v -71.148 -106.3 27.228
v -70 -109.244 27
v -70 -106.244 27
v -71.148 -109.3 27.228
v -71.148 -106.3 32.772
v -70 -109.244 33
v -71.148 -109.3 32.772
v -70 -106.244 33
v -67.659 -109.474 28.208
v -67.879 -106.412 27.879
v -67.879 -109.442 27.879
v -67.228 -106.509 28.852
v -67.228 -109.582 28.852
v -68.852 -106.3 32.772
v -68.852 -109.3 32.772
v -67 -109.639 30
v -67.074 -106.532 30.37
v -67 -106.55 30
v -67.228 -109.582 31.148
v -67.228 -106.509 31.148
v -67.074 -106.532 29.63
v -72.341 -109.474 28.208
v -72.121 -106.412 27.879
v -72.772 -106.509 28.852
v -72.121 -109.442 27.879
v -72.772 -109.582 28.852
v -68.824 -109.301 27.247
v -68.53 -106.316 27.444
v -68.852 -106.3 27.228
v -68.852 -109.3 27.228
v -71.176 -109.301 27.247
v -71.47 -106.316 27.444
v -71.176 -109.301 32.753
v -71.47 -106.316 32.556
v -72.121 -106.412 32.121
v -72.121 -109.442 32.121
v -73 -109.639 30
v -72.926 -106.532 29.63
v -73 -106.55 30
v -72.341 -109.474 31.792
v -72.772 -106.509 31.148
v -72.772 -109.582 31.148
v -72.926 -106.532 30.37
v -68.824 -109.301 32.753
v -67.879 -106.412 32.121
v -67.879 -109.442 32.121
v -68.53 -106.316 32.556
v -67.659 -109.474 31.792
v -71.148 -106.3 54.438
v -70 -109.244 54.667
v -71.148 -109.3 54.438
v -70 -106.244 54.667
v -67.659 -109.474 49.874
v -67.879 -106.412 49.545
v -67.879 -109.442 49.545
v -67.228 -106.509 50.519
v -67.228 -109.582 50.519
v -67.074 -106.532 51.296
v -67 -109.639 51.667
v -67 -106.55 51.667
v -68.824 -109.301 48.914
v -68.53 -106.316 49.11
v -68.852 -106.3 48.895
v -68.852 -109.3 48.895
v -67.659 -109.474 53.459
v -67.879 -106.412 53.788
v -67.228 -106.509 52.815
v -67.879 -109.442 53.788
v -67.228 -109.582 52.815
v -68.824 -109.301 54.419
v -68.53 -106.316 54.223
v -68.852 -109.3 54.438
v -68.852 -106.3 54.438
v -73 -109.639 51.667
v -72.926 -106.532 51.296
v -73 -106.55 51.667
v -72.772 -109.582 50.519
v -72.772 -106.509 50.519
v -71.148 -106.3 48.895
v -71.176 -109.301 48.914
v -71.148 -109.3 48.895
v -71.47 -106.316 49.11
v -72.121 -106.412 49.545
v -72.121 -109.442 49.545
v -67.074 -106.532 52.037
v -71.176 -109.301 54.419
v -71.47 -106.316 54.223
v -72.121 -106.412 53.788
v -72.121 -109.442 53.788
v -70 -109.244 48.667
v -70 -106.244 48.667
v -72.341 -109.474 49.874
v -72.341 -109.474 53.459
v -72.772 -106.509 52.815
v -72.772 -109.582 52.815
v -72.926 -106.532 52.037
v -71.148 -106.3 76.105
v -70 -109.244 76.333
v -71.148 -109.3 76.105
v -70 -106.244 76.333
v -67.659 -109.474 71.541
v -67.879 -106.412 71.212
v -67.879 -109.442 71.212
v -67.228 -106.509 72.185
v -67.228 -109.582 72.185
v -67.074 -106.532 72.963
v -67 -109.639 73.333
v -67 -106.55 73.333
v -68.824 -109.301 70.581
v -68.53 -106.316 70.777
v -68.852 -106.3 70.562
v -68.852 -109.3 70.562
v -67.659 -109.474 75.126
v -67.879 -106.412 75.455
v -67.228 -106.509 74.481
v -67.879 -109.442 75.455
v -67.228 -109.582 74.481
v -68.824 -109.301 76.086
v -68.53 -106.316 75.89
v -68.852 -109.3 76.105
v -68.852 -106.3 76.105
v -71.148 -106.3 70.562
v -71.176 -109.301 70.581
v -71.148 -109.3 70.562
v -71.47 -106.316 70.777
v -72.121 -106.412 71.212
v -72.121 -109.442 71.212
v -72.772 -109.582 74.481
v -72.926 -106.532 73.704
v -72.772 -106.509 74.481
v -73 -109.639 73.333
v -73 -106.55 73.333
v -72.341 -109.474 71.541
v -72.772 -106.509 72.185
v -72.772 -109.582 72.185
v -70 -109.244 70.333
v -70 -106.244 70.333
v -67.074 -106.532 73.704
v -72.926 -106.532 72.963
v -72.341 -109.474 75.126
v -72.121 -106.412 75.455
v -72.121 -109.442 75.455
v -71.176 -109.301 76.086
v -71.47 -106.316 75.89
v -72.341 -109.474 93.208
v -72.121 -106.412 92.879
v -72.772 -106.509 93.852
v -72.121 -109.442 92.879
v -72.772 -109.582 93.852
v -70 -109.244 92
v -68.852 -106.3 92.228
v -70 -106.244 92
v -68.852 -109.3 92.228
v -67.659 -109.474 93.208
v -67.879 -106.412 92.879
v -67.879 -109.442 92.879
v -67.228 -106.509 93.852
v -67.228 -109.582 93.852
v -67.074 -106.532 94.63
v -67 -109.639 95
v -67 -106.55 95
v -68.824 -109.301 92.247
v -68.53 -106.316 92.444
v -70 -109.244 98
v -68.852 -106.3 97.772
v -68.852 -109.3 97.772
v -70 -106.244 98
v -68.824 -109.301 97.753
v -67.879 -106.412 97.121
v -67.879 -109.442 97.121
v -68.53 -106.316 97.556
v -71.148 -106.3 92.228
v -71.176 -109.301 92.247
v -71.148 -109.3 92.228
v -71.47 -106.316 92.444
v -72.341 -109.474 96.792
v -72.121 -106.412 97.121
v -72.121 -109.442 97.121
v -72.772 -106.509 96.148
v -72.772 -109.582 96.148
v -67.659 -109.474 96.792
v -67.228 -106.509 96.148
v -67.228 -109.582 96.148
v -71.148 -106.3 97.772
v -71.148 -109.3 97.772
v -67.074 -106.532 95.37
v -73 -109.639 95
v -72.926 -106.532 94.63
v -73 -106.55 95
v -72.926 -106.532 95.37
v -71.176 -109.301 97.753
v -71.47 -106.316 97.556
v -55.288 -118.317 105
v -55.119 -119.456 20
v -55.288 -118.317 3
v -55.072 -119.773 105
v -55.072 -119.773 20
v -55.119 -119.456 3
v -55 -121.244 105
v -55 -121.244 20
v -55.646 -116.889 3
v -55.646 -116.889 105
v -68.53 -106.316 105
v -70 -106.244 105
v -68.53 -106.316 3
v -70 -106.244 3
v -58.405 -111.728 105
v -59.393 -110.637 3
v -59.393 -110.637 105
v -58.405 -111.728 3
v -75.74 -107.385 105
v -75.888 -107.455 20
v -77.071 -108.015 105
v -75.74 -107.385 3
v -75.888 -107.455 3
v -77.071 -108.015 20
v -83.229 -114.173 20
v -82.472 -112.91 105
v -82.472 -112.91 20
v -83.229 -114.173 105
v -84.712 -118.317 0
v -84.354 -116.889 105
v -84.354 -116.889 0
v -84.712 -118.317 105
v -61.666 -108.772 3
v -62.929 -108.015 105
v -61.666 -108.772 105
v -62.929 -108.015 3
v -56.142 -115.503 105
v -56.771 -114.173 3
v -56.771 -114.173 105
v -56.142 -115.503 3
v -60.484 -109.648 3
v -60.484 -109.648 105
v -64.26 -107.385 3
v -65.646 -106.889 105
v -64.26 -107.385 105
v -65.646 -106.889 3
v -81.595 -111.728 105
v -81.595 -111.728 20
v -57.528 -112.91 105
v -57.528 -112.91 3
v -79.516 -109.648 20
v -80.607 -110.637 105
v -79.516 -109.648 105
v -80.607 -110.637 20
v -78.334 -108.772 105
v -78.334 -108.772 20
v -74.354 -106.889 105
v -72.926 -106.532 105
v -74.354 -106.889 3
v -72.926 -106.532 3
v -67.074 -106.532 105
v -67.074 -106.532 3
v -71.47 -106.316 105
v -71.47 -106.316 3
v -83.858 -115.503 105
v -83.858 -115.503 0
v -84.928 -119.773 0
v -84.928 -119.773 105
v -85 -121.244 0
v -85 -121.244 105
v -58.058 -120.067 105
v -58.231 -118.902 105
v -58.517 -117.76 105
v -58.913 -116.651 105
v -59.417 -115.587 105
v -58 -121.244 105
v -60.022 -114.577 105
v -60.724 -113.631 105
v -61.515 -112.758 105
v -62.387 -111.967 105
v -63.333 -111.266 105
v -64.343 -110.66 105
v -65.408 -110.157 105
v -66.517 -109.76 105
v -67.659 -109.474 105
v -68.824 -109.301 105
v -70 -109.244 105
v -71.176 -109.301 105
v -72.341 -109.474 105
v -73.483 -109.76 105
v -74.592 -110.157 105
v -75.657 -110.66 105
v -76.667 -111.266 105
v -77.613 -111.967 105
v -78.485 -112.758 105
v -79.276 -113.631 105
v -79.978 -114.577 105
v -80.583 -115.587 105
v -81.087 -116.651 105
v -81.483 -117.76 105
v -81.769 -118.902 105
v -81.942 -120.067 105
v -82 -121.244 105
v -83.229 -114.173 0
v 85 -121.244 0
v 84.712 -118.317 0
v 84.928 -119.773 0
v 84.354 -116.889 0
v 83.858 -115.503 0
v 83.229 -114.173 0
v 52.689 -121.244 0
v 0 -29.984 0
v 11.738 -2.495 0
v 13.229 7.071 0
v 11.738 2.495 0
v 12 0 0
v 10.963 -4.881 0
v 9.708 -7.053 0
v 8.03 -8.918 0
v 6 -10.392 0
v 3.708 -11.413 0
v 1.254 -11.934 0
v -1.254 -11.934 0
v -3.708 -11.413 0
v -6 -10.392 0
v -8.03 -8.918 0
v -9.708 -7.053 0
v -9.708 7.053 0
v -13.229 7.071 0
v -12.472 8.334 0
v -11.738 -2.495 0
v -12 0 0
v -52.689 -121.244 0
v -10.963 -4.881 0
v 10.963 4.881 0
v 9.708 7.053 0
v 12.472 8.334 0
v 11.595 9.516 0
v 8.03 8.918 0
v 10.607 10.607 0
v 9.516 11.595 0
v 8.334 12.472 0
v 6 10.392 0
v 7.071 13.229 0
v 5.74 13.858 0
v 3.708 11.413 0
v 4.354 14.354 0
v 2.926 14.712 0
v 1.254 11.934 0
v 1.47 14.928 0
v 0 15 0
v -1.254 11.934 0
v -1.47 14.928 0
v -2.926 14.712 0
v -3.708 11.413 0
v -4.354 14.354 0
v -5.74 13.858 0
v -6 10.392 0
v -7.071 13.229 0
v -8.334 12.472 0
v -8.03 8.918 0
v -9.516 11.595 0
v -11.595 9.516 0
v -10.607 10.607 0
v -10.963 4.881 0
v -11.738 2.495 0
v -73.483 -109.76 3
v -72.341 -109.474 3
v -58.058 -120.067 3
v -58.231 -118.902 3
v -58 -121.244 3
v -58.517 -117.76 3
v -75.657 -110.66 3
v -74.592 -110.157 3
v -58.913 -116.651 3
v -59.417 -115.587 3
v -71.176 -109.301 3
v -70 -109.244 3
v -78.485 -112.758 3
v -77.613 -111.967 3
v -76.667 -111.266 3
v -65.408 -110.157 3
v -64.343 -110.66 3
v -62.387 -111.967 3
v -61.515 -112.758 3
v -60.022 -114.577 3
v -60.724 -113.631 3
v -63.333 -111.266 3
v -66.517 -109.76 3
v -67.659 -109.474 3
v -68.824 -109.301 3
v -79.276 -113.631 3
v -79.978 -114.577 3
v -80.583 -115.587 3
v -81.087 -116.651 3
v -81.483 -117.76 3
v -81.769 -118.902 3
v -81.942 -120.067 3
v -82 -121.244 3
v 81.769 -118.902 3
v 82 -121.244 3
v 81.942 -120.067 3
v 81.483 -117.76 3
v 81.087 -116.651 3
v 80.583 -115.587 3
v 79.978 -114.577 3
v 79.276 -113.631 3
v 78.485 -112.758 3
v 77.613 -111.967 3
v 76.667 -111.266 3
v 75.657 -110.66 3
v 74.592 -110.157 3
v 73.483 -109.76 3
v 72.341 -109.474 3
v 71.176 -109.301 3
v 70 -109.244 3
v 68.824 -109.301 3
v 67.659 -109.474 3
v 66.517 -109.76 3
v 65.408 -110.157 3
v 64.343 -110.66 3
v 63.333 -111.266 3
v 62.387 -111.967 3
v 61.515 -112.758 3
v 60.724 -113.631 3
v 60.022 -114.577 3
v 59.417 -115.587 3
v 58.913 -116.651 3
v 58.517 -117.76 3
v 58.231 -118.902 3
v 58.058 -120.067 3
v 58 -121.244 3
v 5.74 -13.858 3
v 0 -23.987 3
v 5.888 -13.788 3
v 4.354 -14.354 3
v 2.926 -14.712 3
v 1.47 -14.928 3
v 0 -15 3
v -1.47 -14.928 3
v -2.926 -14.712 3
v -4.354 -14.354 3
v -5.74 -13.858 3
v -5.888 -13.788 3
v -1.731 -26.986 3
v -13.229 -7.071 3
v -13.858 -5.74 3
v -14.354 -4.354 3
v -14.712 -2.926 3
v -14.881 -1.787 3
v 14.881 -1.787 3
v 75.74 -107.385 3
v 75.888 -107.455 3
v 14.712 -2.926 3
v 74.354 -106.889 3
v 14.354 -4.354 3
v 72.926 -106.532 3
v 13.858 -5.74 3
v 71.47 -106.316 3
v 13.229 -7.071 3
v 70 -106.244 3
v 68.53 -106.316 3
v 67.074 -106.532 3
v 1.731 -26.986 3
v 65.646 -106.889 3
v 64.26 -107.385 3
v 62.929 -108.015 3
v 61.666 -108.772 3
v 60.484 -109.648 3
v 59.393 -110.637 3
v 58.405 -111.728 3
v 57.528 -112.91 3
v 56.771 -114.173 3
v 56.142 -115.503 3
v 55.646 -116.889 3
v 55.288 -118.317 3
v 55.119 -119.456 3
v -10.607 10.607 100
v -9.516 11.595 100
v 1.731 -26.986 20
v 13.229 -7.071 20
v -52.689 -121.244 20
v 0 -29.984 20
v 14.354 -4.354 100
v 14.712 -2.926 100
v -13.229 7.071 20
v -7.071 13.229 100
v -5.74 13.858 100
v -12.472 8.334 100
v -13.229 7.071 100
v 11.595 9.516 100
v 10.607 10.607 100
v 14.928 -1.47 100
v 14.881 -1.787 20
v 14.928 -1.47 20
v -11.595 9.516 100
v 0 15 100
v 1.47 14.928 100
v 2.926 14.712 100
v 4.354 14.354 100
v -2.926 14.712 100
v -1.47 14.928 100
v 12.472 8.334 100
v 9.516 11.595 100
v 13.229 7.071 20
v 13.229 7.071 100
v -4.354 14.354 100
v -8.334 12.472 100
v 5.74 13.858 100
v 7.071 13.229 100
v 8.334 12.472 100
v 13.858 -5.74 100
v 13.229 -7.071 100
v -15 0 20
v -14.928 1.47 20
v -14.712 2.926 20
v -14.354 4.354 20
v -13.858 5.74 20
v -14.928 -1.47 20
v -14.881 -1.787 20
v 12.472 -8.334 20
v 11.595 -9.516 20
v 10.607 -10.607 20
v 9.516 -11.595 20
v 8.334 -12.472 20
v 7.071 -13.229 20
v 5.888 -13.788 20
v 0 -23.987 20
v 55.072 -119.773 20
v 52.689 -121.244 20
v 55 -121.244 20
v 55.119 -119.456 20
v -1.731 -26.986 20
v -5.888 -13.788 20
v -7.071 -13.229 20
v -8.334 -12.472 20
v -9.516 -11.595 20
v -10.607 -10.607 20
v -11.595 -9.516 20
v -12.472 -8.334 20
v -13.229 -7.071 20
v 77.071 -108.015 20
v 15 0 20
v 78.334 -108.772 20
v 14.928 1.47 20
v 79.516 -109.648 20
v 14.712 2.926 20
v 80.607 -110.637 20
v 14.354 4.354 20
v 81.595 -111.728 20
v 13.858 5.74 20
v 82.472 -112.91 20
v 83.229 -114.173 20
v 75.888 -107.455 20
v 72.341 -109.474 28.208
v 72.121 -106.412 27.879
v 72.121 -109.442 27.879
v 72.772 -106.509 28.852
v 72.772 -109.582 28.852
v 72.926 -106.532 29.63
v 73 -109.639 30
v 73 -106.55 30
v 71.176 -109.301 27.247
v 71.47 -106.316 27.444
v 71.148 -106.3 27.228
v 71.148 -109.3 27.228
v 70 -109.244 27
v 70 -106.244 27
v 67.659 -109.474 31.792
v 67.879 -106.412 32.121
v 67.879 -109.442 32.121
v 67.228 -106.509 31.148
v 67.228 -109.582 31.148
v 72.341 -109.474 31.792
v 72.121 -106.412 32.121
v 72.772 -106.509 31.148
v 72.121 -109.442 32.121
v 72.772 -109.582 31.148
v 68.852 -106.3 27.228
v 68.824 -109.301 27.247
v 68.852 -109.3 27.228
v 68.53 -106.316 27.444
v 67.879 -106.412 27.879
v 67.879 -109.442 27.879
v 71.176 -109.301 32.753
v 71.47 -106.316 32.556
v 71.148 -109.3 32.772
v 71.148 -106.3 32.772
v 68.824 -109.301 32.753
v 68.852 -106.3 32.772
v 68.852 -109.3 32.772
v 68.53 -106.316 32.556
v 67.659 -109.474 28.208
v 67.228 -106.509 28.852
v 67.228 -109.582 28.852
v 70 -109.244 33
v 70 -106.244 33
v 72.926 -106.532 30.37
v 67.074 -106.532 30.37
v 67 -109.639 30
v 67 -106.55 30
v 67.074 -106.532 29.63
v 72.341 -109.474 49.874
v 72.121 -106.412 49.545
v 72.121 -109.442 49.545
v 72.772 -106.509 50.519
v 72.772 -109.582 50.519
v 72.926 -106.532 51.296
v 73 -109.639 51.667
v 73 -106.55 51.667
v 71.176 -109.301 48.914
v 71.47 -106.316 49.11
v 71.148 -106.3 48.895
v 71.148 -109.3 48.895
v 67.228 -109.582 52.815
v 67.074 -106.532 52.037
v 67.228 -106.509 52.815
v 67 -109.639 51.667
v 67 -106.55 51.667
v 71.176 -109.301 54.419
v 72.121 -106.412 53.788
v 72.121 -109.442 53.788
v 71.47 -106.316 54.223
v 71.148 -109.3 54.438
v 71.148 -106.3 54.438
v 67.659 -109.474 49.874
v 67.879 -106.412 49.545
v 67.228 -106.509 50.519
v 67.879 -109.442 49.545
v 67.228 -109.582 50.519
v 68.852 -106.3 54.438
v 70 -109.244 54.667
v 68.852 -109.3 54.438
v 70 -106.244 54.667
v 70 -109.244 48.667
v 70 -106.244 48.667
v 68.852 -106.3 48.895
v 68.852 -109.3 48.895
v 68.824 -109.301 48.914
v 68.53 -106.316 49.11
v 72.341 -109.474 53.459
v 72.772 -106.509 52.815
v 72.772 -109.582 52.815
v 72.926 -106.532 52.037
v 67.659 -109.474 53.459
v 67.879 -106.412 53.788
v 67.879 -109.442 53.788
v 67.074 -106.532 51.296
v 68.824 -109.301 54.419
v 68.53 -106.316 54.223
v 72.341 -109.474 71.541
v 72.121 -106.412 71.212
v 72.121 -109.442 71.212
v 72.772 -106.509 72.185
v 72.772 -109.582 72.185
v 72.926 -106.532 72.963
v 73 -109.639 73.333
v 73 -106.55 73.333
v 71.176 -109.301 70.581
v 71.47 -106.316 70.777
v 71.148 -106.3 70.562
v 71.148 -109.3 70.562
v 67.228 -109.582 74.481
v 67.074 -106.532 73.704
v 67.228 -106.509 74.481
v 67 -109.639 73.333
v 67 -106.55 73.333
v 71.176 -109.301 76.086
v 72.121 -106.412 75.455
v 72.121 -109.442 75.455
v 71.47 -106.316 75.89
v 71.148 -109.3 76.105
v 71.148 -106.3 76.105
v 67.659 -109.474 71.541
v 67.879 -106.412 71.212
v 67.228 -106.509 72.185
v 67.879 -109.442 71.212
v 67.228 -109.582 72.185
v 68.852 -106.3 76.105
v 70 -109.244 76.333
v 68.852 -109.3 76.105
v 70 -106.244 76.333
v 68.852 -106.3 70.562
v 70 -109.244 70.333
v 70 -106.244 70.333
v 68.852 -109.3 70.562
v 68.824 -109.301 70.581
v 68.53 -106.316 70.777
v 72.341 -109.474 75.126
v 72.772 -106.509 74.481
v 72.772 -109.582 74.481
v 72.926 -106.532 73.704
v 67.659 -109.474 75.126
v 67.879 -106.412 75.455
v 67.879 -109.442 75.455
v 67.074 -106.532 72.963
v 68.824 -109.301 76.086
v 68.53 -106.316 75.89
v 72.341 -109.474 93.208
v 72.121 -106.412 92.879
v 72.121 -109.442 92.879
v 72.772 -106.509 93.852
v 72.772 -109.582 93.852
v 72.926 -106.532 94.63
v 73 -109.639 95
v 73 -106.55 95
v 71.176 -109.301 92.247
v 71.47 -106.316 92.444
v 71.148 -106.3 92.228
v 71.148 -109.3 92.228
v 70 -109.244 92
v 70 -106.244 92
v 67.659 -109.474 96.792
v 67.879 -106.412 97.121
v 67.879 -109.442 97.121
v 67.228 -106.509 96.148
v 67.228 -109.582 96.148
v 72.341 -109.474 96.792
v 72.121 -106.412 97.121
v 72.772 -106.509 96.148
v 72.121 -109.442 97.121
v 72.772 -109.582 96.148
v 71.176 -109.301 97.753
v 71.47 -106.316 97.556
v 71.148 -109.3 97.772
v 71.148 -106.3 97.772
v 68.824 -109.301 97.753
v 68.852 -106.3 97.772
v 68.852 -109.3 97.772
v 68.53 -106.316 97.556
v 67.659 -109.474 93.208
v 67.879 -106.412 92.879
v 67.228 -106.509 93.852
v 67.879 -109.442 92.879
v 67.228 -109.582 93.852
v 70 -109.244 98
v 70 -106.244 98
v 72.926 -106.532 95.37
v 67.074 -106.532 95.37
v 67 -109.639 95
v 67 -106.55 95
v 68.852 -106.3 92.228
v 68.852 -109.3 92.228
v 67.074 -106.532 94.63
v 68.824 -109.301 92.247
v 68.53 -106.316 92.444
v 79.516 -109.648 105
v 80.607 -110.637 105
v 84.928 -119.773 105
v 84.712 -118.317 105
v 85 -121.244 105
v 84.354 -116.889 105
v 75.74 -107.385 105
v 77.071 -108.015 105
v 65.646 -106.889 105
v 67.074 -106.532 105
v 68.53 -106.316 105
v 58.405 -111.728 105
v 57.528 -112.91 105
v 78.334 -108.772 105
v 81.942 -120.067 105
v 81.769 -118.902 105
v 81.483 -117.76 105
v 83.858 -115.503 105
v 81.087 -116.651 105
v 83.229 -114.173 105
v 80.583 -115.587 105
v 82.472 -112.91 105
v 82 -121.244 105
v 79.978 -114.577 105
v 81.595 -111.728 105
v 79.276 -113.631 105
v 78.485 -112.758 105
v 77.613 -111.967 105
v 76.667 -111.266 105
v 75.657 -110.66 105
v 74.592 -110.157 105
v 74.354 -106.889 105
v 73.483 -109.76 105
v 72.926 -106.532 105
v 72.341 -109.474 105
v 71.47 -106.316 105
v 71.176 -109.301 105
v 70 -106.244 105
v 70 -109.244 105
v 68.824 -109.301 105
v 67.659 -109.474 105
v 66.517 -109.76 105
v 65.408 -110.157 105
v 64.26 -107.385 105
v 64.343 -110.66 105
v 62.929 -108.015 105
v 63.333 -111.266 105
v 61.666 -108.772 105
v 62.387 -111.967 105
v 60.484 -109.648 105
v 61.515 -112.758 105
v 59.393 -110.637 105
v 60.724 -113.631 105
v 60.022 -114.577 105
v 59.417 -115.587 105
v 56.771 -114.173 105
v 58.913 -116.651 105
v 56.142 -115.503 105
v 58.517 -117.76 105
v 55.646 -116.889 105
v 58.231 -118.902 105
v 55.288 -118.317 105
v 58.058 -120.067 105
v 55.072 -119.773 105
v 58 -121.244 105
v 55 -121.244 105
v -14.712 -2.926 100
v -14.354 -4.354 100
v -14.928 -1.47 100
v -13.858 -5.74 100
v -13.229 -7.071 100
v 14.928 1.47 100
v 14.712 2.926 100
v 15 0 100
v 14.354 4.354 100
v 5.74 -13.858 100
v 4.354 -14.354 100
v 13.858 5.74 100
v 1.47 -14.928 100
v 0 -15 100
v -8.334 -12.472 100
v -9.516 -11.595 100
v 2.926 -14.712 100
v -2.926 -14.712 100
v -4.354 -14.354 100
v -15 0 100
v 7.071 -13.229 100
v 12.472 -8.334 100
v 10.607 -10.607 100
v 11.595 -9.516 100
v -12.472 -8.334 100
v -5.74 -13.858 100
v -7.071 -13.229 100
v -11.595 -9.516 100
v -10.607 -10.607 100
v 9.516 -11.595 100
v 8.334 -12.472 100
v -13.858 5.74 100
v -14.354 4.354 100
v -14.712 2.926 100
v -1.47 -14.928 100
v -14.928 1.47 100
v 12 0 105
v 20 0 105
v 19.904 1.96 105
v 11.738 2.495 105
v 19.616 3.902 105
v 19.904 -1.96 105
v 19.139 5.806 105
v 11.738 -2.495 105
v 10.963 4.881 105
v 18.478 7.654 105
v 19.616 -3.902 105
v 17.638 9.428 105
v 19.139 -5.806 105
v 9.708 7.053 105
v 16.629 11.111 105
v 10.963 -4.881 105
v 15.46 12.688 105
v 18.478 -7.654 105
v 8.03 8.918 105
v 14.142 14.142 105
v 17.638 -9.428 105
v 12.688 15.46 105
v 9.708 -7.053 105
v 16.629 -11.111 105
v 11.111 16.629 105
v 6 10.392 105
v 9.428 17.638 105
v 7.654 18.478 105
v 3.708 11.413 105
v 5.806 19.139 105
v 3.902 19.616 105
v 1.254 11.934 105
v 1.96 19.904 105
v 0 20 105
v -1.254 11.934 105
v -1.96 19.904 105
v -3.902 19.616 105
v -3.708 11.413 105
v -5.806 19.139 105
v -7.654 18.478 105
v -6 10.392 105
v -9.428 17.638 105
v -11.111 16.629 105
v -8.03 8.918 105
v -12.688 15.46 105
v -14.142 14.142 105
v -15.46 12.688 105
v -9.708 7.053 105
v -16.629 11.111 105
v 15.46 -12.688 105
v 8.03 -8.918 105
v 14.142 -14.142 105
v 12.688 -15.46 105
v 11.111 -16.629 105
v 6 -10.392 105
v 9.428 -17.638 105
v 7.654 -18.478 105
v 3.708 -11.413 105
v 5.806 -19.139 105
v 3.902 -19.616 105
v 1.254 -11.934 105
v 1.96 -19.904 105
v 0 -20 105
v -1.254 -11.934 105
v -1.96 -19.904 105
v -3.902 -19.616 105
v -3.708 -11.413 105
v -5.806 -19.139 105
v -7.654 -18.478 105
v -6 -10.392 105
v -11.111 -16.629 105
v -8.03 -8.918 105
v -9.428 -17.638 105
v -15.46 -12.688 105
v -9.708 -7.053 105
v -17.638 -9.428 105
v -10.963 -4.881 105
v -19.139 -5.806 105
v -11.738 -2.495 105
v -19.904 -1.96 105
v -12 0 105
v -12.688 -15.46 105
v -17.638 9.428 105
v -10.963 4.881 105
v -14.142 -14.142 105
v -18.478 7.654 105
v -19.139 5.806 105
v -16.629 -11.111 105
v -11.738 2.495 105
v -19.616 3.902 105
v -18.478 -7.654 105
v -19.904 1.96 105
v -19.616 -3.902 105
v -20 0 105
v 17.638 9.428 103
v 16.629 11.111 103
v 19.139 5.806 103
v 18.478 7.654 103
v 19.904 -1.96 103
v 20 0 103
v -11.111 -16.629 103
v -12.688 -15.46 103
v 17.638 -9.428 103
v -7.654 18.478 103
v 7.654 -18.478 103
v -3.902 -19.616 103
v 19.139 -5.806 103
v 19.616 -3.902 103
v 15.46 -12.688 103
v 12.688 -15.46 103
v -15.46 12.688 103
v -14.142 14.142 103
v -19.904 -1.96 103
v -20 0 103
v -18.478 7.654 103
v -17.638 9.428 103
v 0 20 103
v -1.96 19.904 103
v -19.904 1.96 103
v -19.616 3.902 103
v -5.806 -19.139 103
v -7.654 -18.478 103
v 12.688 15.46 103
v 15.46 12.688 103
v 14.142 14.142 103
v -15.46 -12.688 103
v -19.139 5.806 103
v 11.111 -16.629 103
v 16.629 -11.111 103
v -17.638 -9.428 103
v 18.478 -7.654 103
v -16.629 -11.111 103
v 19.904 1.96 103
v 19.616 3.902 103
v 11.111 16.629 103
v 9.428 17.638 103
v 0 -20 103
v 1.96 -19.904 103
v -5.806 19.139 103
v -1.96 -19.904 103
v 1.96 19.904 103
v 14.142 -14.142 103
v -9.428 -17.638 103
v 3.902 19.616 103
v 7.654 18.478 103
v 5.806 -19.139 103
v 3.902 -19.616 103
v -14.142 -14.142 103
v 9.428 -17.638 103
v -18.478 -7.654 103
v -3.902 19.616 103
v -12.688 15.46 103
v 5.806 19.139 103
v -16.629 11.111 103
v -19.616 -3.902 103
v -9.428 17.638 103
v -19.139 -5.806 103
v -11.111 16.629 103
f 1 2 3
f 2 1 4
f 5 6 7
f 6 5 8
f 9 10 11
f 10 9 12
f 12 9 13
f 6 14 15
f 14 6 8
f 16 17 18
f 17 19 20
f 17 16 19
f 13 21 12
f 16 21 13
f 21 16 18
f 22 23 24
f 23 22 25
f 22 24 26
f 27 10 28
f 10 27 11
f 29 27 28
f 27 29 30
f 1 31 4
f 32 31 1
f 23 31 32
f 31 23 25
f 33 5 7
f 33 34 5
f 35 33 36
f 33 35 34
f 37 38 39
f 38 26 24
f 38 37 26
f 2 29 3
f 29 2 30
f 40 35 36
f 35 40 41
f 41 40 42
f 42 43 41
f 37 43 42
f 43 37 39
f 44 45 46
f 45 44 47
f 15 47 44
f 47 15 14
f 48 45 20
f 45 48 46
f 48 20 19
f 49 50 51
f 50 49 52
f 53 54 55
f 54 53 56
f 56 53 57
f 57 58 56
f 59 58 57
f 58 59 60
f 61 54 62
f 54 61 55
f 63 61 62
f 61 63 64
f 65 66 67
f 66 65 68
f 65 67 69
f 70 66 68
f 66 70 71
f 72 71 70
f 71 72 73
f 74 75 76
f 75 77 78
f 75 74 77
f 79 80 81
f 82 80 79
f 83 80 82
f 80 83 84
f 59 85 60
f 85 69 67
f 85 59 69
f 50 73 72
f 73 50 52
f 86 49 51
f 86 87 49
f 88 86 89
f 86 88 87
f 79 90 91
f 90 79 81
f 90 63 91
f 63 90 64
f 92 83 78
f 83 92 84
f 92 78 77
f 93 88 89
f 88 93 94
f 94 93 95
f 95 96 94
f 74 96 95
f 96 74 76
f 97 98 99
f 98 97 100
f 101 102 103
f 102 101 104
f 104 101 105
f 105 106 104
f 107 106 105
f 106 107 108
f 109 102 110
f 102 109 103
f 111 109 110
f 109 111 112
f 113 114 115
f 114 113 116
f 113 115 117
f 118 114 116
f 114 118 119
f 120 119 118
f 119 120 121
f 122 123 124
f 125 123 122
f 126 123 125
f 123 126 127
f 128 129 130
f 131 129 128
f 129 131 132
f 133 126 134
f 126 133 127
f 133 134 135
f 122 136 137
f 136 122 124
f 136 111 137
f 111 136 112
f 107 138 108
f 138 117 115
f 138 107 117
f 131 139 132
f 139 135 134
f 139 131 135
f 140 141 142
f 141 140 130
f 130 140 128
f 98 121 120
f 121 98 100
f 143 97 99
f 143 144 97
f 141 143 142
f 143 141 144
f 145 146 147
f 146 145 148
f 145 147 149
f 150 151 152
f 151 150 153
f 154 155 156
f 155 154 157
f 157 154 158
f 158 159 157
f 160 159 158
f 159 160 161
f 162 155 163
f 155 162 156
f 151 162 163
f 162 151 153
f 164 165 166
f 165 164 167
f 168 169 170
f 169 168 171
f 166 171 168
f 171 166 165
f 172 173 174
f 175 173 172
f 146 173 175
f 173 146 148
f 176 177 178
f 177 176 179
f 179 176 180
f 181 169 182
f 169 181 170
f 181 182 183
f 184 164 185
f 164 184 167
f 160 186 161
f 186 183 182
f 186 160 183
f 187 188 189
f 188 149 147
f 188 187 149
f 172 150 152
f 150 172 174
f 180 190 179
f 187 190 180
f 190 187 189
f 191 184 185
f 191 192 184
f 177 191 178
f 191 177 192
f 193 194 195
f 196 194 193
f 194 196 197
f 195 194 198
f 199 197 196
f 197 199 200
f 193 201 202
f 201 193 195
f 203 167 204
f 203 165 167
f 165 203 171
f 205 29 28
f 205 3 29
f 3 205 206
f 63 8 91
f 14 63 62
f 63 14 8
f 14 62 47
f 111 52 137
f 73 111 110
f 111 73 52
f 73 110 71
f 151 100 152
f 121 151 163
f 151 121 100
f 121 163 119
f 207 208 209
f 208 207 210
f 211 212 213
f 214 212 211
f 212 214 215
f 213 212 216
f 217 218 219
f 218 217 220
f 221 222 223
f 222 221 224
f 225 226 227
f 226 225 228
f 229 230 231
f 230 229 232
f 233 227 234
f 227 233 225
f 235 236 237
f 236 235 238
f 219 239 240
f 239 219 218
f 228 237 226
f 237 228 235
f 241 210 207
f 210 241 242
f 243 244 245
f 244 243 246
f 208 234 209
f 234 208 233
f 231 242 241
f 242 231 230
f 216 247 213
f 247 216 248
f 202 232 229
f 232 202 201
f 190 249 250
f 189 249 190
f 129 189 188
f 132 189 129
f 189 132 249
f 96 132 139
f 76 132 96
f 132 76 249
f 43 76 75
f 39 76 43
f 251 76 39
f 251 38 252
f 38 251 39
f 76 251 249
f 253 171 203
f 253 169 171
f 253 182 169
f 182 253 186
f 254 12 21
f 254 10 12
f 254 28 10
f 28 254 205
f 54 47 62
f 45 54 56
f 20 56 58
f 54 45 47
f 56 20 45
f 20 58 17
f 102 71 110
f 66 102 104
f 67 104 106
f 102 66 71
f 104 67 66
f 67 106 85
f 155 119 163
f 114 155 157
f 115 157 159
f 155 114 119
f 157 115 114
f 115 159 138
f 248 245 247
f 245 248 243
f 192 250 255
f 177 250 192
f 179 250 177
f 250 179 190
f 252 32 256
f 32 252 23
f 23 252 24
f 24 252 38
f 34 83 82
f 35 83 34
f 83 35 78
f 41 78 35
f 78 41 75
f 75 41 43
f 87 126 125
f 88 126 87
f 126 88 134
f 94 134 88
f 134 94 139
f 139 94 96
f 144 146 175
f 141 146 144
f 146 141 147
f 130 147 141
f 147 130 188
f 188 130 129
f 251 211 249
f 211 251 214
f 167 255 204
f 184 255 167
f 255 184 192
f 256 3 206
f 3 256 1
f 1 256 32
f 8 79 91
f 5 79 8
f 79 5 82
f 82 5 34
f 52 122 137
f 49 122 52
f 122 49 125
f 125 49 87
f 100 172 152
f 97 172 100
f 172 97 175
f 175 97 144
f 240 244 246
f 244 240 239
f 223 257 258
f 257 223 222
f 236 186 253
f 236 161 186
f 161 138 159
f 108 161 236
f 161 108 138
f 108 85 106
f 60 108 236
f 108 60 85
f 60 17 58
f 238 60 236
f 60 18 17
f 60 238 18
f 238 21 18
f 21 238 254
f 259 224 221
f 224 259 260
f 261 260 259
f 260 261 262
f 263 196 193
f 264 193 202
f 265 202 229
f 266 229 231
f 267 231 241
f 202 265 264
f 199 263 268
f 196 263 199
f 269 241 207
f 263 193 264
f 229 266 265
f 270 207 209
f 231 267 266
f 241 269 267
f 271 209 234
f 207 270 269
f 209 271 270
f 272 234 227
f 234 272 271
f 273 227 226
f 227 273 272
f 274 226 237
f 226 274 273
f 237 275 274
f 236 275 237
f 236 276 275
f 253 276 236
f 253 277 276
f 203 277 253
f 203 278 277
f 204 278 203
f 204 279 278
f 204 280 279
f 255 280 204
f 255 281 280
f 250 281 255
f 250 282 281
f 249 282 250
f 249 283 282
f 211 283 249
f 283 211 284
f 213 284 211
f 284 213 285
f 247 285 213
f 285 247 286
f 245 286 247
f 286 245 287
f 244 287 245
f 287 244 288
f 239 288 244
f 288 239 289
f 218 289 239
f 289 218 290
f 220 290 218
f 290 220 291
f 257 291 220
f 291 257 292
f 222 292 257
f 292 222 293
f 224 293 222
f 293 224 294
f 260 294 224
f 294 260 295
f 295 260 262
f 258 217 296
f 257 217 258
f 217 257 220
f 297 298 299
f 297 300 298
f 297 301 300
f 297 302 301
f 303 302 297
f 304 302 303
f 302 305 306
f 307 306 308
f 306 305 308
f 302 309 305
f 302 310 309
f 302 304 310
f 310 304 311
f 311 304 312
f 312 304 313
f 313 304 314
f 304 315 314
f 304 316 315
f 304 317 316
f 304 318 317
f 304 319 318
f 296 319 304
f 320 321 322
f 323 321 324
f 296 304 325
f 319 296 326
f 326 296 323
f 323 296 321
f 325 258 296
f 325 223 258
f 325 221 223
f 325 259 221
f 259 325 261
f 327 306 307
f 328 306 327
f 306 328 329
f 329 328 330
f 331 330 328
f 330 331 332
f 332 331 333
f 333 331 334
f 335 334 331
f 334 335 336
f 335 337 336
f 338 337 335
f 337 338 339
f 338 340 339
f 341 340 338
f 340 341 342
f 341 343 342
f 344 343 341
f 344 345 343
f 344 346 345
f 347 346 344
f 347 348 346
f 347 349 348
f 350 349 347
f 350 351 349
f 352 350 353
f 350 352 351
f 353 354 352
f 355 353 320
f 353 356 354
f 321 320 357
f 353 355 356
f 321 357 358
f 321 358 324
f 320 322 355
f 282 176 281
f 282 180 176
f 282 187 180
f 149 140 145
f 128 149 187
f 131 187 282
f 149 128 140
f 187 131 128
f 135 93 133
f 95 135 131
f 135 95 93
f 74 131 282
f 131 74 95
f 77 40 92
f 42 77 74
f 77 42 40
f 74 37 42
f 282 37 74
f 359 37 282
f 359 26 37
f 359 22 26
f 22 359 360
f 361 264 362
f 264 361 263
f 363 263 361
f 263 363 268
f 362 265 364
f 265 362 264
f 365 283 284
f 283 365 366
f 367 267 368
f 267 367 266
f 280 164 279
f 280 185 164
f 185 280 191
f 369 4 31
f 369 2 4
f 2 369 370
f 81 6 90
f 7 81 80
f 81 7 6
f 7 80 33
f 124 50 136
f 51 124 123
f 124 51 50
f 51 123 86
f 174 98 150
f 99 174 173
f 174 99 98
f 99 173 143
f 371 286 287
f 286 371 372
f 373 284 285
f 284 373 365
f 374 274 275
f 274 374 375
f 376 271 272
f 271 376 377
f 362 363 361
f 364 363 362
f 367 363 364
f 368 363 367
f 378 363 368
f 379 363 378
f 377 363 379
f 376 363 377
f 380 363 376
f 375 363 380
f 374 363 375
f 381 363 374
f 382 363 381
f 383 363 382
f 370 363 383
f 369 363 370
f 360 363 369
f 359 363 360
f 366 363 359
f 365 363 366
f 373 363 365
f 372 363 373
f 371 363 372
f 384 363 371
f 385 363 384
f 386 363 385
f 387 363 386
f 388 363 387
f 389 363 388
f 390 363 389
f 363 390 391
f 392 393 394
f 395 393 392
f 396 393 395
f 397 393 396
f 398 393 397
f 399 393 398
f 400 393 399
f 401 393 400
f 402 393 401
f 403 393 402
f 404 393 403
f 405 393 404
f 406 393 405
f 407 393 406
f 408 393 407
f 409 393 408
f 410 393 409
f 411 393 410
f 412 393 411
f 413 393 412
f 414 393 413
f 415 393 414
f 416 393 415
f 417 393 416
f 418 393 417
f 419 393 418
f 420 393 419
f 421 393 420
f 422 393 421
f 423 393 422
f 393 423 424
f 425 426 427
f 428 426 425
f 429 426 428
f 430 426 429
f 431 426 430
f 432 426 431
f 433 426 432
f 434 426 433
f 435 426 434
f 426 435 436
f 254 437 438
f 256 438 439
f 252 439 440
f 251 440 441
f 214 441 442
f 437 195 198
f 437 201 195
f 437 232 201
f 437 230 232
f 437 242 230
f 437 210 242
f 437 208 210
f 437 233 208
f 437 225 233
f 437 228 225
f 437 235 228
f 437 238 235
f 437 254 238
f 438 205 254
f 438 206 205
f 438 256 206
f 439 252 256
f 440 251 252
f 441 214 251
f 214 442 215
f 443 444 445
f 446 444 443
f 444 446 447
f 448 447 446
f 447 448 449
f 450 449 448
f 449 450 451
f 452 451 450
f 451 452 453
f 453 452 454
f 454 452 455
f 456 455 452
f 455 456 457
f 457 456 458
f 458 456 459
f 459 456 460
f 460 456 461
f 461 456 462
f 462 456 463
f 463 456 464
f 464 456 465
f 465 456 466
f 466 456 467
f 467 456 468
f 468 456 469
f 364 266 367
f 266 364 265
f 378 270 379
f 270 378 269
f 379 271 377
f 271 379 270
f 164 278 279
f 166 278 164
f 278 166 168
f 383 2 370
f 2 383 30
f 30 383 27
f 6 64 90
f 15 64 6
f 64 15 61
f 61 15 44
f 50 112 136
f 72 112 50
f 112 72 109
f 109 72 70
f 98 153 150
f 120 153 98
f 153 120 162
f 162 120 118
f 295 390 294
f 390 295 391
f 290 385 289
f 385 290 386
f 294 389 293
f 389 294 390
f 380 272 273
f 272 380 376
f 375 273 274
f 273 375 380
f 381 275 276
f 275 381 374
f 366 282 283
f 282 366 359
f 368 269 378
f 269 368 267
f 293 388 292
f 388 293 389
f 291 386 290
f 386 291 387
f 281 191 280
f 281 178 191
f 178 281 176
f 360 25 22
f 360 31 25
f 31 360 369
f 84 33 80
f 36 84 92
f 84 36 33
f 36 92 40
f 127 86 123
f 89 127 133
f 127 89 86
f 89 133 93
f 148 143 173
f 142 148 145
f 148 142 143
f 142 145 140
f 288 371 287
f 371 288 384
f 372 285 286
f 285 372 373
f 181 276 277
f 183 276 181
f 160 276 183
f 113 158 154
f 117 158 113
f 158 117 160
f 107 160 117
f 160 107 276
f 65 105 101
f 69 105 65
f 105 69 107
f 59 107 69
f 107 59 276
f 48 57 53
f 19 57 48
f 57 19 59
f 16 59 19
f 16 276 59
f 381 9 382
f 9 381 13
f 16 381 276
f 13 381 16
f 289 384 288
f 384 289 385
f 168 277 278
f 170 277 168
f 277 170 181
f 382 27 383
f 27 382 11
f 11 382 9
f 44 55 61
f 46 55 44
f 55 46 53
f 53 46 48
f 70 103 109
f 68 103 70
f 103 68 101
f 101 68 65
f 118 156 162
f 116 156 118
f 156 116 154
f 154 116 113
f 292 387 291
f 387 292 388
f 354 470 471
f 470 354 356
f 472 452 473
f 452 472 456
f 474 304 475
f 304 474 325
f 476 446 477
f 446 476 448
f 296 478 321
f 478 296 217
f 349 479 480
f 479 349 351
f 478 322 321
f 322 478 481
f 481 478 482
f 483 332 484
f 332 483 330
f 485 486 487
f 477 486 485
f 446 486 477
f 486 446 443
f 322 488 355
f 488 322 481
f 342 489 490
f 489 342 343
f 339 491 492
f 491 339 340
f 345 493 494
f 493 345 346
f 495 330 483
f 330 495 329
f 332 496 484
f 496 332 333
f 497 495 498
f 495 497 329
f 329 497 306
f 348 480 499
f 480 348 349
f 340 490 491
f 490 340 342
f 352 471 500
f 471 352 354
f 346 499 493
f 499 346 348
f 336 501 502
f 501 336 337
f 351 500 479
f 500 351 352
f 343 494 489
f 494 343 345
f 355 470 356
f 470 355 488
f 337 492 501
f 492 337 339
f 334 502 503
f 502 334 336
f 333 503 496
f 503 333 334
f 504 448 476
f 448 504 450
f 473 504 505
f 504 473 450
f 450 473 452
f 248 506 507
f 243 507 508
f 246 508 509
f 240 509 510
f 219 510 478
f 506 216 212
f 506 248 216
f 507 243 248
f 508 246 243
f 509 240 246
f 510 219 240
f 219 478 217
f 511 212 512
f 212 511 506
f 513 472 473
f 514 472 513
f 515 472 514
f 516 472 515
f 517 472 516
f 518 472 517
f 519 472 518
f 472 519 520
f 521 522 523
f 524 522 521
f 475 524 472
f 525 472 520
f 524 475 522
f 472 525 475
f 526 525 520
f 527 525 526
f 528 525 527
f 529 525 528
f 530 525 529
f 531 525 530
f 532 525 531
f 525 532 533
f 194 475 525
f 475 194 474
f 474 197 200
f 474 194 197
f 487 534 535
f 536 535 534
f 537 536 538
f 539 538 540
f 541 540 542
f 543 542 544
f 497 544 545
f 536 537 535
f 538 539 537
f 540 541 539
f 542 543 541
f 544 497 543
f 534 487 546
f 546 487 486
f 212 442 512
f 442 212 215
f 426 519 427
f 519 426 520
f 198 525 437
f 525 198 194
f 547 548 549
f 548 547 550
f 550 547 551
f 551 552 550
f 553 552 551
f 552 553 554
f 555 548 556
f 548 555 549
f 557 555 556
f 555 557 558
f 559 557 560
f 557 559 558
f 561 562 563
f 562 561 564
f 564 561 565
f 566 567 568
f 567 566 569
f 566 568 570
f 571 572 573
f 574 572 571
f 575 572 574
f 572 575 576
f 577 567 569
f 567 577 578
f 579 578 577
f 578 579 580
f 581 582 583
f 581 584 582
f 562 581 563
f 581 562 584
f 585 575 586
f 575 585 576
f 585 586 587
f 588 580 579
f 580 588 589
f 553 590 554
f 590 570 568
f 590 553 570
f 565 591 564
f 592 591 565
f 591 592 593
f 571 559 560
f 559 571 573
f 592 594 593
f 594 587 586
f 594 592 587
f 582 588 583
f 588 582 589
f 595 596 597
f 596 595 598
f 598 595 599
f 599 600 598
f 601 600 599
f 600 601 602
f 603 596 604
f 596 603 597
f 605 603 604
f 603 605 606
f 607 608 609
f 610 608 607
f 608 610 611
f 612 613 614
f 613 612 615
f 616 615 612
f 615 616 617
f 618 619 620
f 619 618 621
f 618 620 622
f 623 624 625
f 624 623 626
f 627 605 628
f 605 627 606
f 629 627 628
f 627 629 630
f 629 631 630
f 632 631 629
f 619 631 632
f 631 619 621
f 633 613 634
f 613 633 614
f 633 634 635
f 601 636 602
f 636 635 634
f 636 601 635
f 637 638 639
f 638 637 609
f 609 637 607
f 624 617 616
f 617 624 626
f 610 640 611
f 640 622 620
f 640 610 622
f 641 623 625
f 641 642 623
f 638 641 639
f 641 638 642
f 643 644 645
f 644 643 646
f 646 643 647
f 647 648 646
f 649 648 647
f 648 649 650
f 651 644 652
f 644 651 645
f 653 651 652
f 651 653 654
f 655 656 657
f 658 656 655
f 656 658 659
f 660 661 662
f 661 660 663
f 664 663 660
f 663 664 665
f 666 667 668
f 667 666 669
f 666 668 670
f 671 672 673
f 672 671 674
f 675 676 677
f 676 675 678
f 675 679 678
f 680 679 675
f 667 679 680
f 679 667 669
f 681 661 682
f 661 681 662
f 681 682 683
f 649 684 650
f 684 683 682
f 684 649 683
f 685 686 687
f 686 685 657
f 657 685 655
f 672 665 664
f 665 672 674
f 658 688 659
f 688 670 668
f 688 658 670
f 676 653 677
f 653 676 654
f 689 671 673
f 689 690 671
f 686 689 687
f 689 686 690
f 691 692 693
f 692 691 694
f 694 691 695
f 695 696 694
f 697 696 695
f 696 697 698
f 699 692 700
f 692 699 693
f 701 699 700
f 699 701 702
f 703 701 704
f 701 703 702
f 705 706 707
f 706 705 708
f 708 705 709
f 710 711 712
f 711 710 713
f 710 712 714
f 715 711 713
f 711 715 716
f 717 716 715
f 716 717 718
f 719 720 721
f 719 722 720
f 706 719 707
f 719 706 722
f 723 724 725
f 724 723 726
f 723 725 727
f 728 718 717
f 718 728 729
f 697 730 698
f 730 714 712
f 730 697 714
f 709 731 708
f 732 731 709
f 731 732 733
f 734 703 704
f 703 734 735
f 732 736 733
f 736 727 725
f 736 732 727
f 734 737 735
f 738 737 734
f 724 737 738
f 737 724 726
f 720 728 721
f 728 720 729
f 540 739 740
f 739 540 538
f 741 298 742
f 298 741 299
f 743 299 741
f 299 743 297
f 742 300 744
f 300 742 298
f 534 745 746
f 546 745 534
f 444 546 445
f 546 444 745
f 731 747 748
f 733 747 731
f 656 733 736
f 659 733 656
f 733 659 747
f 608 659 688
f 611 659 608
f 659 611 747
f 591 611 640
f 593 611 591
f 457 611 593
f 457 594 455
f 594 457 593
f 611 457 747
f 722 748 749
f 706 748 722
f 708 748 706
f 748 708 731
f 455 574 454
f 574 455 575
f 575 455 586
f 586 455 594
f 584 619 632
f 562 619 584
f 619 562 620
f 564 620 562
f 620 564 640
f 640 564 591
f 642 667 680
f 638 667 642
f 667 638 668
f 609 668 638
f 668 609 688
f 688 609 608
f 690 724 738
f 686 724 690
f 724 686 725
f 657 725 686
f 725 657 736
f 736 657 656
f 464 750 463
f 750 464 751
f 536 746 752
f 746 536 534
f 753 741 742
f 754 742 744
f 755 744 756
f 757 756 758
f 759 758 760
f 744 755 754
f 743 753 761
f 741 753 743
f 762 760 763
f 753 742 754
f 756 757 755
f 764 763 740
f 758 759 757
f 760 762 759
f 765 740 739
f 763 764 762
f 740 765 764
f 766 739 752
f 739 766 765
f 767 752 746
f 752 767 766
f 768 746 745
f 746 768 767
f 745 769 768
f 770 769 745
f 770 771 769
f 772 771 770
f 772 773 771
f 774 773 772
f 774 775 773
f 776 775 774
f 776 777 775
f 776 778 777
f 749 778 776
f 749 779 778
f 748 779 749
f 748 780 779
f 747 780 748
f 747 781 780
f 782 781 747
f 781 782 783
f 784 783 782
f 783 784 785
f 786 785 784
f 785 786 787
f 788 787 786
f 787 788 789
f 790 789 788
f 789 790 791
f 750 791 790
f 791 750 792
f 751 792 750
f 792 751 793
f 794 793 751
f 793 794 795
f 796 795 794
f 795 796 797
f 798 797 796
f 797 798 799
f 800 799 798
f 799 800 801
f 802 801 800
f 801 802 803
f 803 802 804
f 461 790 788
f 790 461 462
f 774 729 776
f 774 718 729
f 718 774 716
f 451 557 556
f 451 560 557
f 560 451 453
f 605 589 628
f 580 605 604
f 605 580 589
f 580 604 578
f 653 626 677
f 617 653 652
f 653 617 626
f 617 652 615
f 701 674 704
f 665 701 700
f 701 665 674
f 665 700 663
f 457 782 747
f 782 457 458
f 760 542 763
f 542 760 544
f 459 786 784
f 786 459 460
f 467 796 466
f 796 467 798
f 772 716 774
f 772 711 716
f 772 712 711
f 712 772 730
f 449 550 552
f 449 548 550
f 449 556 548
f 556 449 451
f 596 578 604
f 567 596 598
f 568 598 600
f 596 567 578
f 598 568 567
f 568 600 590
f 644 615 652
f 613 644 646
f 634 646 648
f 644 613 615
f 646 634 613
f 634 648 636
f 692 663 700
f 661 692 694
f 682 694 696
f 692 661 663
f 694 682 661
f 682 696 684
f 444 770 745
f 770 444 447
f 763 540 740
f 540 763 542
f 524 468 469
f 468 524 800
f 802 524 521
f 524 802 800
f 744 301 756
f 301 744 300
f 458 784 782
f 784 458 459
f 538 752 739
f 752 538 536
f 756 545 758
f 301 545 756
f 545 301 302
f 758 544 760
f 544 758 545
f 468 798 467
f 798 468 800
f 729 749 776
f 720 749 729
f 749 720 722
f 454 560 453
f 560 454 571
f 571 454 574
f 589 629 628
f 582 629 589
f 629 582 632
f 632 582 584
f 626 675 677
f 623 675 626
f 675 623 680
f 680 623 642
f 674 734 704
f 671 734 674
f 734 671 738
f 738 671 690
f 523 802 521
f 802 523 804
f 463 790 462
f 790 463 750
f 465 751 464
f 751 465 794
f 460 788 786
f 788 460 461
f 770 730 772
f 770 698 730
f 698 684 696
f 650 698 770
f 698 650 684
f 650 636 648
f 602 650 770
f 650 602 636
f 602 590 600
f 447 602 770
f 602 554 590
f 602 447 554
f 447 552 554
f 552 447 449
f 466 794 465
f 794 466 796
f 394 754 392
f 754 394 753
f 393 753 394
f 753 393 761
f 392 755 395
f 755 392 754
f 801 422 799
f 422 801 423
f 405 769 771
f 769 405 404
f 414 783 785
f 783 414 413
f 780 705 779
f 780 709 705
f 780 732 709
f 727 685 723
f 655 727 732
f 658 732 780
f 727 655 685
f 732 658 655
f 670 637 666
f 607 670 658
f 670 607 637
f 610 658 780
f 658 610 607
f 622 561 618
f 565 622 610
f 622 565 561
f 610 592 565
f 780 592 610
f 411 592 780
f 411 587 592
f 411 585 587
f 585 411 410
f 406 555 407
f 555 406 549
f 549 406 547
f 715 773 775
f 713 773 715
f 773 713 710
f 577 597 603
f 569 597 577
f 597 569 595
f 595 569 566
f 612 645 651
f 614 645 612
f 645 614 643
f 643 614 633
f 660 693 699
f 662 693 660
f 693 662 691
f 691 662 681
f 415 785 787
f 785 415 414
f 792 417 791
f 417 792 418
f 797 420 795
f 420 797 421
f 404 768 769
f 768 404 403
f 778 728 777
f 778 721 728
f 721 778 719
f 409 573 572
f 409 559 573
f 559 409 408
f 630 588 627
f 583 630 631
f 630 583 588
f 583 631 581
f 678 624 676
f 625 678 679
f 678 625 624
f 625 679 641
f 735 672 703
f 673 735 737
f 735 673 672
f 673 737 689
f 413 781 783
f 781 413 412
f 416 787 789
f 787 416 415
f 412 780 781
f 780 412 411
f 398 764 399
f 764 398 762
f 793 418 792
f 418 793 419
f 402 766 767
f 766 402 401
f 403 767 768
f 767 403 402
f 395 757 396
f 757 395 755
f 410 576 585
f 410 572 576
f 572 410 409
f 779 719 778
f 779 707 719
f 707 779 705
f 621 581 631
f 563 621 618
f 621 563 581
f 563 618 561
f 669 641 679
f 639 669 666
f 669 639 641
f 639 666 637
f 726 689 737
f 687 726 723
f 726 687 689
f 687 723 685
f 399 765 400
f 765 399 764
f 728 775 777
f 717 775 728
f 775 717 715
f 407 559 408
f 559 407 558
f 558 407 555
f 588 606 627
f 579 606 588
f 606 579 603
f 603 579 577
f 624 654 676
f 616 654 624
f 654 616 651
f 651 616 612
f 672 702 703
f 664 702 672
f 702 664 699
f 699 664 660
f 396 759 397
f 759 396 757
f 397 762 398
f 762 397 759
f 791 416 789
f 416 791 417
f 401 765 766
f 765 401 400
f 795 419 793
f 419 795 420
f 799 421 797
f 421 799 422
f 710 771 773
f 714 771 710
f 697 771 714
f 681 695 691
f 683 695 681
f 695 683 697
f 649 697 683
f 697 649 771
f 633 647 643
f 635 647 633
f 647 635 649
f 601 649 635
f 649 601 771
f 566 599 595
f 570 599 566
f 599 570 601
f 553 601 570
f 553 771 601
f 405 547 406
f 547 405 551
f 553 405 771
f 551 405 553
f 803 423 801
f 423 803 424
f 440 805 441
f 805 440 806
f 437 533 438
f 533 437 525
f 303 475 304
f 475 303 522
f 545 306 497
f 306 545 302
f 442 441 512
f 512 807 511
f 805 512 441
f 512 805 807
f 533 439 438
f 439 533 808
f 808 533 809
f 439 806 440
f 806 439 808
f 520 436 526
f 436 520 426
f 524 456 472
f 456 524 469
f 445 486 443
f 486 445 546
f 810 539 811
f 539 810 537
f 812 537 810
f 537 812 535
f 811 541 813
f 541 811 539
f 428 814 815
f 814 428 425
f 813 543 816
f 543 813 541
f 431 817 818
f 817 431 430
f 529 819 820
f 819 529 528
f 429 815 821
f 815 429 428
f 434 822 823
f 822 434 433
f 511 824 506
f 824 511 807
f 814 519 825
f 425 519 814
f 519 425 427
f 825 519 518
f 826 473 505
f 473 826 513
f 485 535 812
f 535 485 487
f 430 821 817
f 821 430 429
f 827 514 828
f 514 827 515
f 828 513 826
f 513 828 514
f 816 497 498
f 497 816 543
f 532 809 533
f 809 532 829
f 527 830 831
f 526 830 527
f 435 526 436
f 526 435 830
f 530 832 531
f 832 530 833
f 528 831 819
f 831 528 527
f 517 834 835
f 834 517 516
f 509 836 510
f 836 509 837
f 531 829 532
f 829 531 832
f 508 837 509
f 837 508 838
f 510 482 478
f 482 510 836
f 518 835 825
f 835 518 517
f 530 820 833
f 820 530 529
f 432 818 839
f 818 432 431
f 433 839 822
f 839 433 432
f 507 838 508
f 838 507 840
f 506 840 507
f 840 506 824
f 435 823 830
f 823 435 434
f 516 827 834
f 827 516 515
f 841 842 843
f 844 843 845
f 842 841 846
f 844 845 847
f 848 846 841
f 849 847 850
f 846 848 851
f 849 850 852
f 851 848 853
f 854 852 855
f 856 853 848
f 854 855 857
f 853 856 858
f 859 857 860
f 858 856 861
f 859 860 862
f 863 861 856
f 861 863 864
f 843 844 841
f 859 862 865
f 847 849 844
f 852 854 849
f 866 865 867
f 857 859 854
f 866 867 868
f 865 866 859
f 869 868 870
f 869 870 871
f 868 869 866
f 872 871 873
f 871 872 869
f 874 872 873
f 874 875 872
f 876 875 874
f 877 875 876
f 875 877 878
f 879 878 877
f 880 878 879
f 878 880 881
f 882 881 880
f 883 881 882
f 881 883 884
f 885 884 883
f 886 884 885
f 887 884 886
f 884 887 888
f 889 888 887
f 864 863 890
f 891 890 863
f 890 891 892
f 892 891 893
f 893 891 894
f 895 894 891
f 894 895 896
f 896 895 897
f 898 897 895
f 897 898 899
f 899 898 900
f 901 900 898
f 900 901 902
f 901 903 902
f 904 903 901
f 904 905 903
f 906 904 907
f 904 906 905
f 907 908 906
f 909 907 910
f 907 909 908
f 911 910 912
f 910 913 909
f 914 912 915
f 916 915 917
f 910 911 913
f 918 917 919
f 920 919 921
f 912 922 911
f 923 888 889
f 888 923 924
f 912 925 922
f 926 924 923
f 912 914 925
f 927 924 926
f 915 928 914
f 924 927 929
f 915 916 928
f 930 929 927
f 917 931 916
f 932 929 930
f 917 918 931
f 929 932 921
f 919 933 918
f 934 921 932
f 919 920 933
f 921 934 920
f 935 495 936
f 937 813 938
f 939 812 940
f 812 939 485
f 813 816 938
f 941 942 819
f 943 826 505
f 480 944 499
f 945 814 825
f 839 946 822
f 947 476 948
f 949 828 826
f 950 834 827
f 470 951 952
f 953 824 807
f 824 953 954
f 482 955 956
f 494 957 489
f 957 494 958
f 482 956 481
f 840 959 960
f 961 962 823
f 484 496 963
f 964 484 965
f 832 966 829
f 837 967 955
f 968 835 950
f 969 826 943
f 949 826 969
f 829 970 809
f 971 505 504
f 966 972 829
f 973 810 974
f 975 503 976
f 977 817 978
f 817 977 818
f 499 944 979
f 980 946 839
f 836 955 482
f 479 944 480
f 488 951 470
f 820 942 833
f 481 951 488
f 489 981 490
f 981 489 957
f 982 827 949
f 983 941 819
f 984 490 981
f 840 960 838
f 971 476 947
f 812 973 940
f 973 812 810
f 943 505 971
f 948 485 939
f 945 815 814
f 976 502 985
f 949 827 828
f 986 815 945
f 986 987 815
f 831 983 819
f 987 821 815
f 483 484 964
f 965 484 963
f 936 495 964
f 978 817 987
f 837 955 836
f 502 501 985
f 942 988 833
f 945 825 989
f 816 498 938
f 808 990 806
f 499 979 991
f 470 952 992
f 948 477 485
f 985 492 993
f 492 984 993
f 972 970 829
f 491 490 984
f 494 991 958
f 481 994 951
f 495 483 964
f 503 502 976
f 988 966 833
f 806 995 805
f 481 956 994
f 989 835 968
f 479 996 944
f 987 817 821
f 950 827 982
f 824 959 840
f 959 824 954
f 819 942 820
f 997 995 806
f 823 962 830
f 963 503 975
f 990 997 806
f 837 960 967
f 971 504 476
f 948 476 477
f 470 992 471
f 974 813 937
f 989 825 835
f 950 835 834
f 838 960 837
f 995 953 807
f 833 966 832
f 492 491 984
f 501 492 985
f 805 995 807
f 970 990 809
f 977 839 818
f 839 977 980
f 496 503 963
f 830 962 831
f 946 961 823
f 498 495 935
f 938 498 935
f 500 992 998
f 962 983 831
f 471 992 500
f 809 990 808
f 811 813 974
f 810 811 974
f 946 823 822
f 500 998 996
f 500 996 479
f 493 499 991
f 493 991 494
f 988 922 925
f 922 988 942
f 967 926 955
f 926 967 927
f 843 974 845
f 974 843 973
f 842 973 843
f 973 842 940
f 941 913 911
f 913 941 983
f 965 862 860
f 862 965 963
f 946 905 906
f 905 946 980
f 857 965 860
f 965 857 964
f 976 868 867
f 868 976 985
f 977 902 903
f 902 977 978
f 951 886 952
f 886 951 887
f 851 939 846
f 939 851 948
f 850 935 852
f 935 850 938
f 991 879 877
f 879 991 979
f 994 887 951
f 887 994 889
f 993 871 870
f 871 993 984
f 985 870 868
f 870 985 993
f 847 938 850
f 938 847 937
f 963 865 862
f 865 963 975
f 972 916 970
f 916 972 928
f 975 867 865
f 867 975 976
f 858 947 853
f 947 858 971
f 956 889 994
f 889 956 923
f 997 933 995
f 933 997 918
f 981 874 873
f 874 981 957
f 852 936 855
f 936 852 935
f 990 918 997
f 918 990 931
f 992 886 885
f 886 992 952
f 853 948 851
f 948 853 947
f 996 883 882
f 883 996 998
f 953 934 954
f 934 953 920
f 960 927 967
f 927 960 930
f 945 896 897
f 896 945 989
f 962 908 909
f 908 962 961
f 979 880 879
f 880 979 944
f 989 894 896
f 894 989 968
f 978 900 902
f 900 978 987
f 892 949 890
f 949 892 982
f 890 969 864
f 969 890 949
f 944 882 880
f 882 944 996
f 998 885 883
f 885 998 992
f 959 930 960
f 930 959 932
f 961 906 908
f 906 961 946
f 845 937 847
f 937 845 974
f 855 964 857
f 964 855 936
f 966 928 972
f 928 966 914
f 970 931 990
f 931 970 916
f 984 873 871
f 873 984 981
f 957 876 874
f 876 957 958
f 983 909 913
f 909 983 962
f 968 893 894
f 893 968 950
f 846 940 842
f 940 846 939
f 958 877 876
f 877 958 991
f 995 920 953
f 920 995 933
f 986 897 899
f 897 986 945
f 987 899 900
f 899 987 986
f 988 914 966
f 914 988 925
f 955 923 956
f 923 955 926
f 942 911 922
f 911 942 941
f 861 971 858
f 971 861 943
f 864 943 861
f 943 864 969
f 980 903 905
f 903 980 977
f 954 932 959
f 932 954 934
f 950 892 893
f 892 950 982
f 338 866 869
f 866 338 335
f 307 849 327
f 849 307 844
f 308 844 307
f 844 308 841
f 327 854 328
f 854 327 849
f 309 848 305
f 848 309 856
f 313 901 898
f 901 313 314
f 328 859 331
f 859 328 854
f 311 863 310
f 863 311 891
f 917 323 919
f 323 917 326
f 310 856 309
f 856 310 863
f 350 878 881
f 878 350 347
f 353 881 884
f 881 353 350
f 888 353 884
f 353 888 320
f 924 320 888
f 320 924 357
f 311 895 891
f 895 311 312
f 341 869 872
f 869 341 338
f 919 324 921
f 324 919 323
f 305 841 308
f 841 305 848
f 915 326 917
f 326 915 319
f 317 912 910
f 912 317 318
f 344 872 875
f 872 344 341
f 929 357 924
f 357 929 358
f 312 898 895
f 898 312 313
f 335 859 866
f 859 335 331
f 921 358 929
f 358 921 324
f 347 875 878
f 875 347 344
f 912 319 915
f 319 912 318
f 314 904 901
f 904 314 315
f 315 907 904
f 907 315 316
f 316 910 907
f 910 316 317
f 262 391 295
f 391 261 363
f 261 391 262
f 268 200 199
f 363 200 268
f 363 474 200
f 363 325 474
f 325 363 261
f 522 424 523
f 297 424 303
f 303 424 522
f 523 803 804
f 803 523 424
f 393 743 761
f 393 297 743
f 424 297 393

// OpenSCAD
H = 105;
S = 140;
pillarH = 20;
thick = 3;
coreR = 15;


difference() {
    union () {
        cylinder(r = coreR, h = H, $fn = 64);
        translate([0, 0, H - 5])
            cylinder(r1 = coreR, r2 = coreR + 5, h = 3, $fn = 64);
        translate([0, 0, H - 2])
            cylinder(r = coreR + 5, h = 2, $fn = 64);

        for (x = [-1, 1]) {
            difference () {
                translate([x * S * cos(60), -S * sin(60), 0])
                    cylinder(r = coreR, h = H, $fn = 64);
                translate([x * S * cos(60), -S * sin(60), thick])
                    cylinder(r = coreR - thick, h = H - thick, $fn = 64);
                for (z = [0:3]) {
                    translate([x * S * cos(60), -S * sin(60), pillarH + 10 + (H - pillarH - 20) / 3 * z])
                        rotate([-90, 0, 0])
                            cylinder(r = 3, h = 100, $fn = 16);
                }
            }
            difference() {
                hull() {
                    cylinder(r = coreR, h = pillarH, $fn = 64);
                    translate([x * S * cos(60), -S * sin(60), 0])
                        cylinder(r = coreR, h = pillarH, $fn = 64);
                }
                hull() {
                    translate([0, 0, thick]) {
                        cylinder(r = coreR - thick, h = pillarH, $fn = 64);
                        translate([x * S * cos(60), -S * sin(60), 0])
                            cylinder(r = coreR - thick, h = pillarH, $fn = 64);
                    }
                }
            }
        }
    }

    cylinder(r = coreR - thick, h = H, $hn = 64);
    translate([-100, -S * sin(60) - 100, 0])
        cube([500, 100, 500]);
}
